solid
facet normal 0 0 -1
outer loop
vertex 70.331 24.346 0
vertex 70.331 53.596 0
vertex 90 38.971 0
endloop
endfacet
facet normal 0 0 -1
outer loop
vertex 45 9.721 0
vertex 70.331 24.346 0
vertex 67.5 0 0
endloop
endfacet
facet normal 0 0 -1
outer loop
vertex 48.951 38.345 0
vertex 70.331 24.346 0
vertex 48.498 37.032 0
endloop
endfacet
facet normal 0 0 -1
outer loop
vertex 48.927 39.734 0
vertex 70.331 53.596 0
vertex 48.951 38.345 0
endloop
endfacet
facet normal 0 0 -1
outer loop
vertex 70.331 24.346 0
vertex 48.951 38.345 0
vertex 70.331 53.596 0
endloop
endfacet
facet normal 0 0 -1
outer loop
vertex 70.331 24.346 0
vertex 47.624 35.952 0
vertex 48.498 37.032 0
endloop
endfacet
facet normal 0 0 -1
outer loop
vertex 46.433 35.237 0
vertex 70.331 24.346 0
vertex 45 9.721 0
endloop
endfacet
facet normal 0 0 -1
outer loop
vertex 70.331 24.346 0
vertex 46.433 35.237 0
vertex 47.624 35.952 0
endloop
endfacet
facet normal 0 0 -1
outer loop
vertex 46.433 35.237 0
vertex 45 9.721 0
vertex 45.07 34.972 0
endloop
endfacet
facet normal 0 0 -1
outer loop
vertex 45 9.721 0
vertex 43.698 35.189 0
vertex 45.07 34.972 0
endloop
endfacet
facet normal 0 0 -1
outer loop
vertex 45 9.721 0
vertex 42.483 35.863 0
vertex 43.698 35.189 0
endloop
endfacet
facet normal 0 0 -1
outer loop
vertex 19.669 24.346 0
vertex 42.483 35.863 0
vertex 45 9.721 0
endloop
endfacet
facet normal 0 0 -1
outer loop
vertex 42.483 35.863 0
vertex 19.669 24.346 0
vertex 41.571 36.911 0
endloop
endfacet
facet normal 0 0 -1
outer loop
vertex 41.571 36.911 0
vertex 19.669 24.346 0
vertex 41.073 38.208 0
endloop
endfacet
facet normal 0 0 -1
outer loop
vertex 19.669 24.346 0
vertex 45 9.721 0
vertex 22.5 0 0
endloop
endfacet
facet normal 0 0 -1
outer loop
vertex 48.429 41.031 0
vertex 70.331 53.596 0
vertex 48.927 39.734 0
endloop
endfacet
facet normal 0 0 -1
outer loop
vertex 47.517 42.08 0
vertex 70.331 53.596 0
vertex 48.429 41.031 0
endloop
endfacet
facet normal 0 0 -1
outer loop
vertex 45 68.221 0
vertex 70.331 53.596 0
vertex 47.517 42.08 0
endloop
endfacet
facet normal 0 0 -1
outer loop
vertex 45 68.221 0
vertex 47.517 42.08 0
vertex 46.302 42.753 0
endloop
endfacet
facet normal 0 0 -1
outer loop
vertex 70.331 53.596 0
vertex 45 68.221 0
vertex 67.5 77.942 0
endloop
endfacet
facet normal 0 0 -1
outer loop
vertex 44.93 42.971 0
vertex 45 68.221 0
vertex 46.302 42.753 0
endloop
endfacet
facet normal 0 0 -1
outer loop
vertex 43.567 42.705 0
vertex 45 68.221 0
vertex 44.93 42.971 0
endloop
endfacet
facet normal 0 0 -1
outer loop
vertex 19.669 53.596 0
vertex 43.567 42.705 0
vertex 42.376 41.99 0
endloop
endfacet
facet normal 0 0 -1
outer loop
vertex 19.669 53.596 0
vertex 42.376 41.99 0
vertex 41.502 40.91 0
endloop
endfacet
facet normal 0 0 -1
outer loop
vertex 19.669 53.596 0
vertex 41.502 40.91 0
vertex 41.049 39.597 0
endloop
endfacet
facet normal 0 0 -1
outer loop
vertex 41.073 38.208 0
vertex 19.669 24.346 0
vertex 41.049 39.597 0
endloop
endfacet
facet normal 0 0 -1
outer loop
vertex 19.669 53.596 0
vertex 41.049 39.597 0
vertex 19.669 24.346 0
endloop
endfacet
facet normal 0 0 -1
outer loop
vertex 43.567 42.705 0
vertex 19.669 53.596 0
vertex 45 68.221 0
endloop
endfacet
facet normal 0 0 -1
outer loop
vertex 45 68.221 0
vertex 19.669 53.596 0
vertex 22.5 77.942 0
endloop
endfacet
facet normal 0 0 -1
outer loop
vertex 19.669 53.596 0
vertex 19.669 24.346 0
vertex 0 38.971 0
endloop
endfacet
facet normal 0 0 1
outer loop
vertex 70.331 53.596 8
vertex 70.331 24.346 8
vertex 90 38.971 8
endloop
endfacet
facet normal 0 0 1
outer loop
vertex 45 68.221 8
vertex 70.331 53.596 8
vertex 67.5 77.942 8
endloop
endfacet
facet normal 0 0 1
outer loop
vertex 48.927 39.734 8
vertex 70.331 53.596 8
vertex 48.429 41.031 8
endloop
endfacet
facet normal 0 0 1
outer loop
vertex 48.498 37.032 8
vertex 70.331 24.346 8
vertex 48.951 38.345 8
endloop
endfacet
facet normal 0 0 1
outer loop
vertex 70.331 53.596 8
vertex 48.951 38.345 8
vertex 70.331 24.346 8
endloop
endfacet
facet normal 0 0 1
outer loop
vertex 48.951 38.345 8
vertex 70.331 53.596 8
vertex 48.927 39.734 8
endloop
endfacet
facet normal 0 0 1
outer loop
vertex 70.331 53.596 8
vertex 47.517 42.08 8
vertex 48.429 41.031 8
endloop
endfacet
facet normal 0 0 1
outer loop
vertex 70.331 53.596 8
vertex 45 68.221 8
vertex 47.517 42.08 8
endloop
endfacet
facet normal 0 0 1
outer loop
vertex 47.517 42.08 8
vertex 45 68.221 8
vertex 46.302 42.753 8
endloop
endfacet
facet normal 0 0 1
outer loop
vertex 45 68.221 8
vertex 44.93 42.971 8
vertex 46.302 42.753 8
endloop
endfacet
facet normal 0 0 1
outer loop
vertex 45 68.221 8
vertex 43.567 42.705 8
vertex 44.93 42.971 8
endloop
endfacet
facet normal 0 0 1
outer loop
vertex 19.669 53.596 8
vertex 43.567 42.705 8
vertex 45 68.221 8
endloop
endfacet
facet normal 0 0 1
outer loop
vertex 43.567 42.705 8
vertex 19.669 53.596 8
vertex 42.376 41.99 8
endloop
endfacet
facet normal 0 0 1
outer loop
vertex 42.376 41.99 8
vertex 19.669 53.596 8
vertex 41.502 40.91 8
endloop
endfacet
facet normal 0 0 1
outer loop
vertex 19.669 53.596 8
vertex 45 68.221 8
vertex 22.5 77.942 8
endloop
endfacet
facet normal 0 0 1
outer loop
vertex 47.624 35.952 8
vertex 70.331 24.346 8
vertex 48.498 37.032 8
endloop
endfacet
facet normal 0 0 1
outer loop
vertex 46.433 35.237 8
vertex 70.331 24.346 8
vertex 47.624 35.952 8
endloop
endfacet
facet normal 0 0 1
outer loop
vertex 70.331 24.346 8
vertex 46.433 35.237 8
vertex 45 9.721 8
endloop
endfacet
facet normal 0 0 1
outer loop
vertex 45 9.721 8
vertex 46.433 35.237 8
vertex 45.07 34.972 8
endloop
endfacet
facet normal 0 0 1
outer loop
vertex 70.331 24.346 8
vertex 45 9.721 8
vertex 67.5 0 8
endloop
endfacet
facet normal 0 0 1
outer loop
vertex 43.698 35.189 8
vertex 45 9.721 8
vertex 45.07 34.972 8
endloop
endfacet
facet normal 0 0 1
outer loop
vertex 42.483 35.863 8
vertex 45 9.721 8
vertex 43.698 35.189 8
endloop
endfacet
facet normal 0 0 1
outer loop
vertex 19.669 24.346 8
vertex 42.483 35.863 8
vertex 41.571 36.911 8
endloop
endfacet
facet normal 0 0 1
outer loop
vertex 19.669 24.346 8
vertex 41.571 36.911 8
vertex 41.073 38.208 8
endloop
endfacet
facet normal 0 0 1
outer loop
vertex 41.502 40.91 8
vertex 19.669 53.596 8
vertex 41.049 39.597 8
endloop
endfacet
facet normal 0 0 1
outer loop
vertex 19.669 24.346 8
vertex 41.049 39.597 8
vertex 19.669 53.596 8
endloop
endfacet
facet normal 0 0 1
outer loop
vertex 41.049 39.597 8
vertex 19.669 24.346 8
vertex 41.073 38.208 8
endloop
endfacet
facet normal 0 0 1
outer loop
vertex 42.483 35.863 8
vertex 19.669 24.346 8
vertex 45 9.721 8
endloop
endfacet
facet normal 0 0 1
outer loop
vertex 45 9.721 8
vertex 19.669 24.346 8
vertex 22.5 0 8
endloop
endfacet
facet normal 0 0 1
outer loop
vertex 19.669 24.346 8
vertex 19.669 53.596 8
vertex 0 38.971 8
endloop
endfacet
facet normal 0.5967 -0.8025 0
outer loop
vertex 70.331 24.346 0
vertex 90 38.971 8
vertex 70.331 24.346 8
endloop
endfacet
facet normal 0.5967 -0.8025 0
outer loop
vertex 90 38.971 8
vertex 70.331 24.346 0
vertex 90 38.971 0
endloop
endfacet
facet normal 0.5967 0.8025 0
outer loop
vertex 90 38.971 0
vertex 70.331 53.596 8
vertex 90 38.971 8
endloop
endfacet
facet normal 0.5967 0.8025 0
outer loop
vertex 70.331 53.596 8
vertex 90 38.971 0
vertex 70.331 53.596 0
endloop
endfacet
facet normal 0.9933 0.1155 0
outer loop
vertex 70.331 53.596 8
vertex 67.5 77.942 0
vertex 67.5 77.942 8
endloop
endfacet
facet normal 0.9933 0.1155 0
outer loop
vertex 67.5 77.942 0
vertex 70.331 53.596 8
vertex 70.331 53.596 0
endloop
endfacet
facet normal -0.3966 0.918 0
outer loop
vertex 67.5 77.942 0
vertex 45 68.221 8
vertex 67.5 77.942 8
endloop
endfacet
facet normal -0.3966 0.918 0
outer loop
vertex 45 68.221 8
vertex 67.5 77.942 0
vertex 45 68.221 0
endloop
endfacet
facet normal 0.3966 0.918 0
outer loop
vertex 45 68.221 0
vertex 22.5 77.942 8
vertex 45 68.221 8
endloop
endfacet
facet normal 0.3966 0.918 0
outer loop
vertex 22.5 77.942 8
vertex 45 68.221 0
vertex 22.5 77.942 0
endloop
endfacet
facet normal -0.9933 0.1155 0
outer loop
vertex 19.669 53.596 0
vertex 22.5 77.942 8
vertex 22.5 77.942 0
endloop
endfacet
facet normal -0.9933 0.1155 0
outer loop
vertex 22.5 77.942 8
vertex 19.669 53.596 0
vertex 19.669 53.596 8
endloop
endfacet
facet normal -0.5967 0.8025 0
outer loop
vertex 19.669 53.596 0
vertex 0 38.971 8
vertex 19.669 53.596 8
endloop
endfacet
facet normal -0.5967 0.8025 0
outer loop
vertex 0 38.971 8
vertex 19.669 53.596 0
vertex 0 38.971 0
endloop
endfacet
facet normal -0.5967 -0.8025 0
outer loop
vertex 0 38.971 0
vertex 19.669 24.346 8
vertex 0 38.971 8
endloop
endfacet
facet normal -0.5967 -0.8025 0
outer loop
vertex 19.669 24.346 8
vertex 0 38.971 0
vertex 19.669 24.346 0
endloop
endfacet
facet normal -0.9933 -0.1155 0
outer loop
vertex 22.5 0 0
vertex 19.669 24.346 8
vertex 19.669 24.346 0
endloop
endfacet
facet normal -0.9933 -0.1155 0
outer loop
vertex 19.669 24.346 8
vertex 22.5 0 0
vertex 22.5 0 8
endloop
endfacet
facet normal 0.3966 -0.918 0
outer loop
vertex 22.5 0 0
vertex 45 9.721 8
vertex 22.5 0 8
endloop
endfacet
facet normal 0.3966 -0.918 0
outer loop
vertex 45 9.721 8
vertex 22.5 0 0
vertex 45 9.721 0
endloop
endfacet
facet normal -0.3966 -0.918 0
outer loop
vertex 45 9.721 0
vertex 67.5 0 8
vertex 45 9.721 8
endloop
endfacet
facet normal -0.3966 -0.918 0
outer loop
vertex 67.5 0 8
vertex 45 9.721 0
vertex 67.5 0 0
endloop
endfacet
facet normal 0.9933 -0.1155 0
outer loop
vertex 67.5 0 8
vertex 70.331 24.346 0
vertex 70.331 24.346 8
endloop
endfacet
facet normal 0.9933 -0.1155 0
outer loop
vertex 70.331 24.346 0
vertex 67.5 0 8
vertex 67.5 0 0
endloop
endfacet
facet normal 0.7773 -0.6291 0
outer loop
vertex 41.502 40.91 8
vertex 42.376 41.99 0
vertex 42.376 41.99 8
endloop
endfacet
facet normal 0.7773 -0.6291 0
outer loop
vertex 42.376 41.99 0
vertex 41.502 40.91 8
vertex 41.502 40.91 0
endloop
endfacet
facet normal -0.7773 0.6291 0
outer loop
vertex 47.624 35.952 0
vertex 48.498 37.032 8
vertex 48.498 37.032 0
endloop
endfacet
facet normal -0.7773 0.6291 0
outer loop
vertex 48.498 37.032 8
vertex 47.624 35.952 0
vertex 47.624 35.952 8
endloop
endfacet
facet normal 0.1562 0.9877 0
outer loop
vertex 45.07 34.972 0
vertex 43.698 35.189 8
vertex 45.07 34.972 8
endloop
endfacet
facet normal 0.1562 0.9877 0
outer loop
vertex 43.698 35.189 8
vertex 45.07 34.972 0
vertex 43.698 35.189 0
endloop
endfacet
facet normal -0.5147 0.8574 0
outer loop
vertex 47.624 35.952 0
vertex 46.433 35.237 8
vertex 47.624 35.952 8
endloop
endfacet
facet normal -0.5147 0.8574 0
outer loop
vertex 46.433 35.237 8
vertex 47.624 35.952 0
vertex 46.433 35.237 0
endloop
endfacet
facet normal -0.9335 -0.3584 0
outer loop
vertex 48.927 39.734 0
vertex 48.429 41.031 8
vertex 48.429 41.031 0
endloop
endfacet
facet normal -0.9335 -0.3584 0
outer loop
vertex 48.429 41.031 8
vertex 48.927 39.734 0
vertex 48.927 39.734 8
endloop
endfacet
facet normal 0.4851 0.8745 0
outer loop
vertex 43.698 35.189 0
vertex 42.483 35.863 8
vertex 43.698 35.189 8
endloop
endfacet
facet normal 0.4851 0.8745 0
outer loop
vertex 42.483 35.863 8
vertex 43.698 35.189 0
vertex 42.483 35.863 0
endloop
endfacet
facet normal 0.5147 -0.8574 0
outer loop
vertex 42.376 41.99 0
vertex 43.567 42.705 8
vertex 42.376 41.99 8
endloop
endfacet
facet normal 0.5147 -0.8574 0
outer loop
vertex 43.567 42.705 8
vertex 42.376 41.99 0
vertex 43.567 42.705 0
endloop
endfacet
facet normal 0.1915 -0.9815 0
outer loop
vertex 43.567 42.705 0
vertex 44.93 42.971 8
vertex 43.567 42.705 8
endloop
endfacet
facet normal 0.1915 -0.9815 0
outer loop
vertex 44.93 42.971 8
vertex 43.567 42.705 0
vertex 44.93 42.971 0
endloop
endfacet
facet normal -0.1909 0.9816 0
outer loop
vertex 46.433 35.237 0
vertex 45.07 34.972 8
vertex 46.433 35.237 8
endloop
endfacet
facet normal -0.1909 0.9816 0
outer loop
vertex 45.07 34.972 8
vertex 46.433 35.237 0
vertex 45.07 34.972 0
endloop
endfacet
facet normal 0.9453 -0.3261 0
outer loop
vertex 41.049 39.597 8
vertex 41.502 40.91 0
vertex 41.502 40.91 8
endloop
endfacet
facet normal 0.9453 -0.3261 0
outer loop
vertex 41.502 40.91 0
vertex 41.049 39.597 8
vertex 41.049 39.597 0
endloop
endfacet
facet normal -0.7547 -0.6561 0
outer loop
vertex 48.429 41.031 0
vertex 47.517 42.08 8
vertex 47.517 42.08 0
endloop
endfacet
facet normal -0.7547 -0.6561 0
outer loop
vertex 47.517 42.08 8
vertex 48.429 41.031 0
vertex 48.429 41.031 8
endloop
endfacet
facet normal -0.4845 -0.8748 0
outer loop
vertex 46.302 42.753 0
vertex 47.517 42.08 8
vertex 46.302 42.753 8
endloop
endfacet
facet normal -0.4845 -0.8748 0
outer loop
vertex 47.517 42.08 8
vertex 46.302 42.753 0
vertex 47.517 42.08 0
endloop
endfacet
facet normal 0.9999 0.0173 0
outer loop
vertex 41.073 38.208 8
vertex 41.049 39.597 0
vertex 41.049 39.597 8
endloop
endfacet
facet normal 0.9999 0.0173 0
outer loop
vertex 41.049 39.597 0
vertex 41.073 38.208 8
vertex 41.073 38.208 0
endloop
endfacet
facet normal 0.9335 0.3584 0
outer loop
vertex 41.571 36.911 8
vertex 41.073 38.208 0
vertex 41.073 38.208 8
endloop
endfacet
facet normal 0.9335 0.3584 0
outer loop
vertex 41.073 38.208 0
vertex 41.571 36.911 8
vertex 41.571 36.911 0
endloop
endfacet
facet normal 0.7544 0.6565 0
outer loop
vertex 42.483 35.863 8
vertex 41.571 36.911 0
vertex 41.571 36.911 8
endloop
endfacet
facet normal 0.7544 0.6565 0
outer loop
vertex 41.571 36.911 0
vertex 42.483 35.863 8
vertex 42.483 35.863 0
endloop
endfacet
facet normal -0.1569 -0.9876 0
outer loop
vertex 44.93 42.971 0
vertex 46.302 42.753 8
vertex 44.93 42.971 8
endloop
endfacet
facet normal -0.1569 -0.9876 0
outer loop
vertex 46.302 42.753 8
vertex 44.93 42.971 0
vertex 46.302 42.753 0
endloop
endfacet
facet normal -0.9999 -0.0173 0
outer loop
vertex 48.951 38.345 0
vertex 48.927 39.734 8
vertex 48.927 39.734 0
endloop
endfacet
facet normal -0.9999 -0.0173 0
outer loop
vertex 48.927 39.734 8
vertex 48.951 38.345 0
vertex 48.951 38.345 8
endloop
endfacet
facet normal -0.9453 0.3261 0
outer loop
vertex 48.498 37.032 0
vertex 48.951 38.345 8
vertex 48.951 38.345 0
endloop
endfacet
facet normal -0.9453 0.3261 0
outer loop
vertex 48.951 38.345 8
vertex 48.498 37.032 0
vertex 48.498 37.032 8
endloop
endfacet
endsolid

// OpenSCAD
$fn = 32;

// ----------------------------------------------------------------------
// Star wheel: 6-point blunt, R45
// ----------------------------------------------------------------------

// --- parameters (mm) ---
n_points = 6;             // number of points / teeth
r_out = 45;               // tip radius
r_in = 29.25;             // root radius
bore_r = 4;               // centre bore radius
plate_t = 8;              // plate thickness, Z (extrusion height)
bore_d = 8;               // centre bore diameter

profile = [[90, 38.971], [70.331, 53.596], [67.5, 77.942], [45, 68.221], [22.5, 77.942], [19.669, 53.596], [0, 38.971], [19.669, 24.346], [22.5, 0], [45, 9.721], [67.5, 0], [70.331, 24.346]];  // primary outline, 12 points, counter clockwise
void_1 = [[48.927, 39.734], [48.429, 41.031], [47.517, 42.08], [46.302, 42.753], [44.93, 42.971], [43.567, 42.705], [42.376, 41.99], [41.502, 40.91], [41.049, 39.597], [41.073, 38.208], [41.571, 36.911], [42.483, 35.863], [43.698, 35.189], [45.07, 34.972], [46.433, 35.237], [47.624, 35.952], [48.498, 37.032], [48.951, 38.345]];  // centre bore, 18 points

// --- the one profile operation ---
difference() {
  linear_extrude(height = plate_t) polygon(points = profile);
  translate([0, 0, -1])
    linear_extrude(height = plate_t + 2) polygon(points = void_1);
}
